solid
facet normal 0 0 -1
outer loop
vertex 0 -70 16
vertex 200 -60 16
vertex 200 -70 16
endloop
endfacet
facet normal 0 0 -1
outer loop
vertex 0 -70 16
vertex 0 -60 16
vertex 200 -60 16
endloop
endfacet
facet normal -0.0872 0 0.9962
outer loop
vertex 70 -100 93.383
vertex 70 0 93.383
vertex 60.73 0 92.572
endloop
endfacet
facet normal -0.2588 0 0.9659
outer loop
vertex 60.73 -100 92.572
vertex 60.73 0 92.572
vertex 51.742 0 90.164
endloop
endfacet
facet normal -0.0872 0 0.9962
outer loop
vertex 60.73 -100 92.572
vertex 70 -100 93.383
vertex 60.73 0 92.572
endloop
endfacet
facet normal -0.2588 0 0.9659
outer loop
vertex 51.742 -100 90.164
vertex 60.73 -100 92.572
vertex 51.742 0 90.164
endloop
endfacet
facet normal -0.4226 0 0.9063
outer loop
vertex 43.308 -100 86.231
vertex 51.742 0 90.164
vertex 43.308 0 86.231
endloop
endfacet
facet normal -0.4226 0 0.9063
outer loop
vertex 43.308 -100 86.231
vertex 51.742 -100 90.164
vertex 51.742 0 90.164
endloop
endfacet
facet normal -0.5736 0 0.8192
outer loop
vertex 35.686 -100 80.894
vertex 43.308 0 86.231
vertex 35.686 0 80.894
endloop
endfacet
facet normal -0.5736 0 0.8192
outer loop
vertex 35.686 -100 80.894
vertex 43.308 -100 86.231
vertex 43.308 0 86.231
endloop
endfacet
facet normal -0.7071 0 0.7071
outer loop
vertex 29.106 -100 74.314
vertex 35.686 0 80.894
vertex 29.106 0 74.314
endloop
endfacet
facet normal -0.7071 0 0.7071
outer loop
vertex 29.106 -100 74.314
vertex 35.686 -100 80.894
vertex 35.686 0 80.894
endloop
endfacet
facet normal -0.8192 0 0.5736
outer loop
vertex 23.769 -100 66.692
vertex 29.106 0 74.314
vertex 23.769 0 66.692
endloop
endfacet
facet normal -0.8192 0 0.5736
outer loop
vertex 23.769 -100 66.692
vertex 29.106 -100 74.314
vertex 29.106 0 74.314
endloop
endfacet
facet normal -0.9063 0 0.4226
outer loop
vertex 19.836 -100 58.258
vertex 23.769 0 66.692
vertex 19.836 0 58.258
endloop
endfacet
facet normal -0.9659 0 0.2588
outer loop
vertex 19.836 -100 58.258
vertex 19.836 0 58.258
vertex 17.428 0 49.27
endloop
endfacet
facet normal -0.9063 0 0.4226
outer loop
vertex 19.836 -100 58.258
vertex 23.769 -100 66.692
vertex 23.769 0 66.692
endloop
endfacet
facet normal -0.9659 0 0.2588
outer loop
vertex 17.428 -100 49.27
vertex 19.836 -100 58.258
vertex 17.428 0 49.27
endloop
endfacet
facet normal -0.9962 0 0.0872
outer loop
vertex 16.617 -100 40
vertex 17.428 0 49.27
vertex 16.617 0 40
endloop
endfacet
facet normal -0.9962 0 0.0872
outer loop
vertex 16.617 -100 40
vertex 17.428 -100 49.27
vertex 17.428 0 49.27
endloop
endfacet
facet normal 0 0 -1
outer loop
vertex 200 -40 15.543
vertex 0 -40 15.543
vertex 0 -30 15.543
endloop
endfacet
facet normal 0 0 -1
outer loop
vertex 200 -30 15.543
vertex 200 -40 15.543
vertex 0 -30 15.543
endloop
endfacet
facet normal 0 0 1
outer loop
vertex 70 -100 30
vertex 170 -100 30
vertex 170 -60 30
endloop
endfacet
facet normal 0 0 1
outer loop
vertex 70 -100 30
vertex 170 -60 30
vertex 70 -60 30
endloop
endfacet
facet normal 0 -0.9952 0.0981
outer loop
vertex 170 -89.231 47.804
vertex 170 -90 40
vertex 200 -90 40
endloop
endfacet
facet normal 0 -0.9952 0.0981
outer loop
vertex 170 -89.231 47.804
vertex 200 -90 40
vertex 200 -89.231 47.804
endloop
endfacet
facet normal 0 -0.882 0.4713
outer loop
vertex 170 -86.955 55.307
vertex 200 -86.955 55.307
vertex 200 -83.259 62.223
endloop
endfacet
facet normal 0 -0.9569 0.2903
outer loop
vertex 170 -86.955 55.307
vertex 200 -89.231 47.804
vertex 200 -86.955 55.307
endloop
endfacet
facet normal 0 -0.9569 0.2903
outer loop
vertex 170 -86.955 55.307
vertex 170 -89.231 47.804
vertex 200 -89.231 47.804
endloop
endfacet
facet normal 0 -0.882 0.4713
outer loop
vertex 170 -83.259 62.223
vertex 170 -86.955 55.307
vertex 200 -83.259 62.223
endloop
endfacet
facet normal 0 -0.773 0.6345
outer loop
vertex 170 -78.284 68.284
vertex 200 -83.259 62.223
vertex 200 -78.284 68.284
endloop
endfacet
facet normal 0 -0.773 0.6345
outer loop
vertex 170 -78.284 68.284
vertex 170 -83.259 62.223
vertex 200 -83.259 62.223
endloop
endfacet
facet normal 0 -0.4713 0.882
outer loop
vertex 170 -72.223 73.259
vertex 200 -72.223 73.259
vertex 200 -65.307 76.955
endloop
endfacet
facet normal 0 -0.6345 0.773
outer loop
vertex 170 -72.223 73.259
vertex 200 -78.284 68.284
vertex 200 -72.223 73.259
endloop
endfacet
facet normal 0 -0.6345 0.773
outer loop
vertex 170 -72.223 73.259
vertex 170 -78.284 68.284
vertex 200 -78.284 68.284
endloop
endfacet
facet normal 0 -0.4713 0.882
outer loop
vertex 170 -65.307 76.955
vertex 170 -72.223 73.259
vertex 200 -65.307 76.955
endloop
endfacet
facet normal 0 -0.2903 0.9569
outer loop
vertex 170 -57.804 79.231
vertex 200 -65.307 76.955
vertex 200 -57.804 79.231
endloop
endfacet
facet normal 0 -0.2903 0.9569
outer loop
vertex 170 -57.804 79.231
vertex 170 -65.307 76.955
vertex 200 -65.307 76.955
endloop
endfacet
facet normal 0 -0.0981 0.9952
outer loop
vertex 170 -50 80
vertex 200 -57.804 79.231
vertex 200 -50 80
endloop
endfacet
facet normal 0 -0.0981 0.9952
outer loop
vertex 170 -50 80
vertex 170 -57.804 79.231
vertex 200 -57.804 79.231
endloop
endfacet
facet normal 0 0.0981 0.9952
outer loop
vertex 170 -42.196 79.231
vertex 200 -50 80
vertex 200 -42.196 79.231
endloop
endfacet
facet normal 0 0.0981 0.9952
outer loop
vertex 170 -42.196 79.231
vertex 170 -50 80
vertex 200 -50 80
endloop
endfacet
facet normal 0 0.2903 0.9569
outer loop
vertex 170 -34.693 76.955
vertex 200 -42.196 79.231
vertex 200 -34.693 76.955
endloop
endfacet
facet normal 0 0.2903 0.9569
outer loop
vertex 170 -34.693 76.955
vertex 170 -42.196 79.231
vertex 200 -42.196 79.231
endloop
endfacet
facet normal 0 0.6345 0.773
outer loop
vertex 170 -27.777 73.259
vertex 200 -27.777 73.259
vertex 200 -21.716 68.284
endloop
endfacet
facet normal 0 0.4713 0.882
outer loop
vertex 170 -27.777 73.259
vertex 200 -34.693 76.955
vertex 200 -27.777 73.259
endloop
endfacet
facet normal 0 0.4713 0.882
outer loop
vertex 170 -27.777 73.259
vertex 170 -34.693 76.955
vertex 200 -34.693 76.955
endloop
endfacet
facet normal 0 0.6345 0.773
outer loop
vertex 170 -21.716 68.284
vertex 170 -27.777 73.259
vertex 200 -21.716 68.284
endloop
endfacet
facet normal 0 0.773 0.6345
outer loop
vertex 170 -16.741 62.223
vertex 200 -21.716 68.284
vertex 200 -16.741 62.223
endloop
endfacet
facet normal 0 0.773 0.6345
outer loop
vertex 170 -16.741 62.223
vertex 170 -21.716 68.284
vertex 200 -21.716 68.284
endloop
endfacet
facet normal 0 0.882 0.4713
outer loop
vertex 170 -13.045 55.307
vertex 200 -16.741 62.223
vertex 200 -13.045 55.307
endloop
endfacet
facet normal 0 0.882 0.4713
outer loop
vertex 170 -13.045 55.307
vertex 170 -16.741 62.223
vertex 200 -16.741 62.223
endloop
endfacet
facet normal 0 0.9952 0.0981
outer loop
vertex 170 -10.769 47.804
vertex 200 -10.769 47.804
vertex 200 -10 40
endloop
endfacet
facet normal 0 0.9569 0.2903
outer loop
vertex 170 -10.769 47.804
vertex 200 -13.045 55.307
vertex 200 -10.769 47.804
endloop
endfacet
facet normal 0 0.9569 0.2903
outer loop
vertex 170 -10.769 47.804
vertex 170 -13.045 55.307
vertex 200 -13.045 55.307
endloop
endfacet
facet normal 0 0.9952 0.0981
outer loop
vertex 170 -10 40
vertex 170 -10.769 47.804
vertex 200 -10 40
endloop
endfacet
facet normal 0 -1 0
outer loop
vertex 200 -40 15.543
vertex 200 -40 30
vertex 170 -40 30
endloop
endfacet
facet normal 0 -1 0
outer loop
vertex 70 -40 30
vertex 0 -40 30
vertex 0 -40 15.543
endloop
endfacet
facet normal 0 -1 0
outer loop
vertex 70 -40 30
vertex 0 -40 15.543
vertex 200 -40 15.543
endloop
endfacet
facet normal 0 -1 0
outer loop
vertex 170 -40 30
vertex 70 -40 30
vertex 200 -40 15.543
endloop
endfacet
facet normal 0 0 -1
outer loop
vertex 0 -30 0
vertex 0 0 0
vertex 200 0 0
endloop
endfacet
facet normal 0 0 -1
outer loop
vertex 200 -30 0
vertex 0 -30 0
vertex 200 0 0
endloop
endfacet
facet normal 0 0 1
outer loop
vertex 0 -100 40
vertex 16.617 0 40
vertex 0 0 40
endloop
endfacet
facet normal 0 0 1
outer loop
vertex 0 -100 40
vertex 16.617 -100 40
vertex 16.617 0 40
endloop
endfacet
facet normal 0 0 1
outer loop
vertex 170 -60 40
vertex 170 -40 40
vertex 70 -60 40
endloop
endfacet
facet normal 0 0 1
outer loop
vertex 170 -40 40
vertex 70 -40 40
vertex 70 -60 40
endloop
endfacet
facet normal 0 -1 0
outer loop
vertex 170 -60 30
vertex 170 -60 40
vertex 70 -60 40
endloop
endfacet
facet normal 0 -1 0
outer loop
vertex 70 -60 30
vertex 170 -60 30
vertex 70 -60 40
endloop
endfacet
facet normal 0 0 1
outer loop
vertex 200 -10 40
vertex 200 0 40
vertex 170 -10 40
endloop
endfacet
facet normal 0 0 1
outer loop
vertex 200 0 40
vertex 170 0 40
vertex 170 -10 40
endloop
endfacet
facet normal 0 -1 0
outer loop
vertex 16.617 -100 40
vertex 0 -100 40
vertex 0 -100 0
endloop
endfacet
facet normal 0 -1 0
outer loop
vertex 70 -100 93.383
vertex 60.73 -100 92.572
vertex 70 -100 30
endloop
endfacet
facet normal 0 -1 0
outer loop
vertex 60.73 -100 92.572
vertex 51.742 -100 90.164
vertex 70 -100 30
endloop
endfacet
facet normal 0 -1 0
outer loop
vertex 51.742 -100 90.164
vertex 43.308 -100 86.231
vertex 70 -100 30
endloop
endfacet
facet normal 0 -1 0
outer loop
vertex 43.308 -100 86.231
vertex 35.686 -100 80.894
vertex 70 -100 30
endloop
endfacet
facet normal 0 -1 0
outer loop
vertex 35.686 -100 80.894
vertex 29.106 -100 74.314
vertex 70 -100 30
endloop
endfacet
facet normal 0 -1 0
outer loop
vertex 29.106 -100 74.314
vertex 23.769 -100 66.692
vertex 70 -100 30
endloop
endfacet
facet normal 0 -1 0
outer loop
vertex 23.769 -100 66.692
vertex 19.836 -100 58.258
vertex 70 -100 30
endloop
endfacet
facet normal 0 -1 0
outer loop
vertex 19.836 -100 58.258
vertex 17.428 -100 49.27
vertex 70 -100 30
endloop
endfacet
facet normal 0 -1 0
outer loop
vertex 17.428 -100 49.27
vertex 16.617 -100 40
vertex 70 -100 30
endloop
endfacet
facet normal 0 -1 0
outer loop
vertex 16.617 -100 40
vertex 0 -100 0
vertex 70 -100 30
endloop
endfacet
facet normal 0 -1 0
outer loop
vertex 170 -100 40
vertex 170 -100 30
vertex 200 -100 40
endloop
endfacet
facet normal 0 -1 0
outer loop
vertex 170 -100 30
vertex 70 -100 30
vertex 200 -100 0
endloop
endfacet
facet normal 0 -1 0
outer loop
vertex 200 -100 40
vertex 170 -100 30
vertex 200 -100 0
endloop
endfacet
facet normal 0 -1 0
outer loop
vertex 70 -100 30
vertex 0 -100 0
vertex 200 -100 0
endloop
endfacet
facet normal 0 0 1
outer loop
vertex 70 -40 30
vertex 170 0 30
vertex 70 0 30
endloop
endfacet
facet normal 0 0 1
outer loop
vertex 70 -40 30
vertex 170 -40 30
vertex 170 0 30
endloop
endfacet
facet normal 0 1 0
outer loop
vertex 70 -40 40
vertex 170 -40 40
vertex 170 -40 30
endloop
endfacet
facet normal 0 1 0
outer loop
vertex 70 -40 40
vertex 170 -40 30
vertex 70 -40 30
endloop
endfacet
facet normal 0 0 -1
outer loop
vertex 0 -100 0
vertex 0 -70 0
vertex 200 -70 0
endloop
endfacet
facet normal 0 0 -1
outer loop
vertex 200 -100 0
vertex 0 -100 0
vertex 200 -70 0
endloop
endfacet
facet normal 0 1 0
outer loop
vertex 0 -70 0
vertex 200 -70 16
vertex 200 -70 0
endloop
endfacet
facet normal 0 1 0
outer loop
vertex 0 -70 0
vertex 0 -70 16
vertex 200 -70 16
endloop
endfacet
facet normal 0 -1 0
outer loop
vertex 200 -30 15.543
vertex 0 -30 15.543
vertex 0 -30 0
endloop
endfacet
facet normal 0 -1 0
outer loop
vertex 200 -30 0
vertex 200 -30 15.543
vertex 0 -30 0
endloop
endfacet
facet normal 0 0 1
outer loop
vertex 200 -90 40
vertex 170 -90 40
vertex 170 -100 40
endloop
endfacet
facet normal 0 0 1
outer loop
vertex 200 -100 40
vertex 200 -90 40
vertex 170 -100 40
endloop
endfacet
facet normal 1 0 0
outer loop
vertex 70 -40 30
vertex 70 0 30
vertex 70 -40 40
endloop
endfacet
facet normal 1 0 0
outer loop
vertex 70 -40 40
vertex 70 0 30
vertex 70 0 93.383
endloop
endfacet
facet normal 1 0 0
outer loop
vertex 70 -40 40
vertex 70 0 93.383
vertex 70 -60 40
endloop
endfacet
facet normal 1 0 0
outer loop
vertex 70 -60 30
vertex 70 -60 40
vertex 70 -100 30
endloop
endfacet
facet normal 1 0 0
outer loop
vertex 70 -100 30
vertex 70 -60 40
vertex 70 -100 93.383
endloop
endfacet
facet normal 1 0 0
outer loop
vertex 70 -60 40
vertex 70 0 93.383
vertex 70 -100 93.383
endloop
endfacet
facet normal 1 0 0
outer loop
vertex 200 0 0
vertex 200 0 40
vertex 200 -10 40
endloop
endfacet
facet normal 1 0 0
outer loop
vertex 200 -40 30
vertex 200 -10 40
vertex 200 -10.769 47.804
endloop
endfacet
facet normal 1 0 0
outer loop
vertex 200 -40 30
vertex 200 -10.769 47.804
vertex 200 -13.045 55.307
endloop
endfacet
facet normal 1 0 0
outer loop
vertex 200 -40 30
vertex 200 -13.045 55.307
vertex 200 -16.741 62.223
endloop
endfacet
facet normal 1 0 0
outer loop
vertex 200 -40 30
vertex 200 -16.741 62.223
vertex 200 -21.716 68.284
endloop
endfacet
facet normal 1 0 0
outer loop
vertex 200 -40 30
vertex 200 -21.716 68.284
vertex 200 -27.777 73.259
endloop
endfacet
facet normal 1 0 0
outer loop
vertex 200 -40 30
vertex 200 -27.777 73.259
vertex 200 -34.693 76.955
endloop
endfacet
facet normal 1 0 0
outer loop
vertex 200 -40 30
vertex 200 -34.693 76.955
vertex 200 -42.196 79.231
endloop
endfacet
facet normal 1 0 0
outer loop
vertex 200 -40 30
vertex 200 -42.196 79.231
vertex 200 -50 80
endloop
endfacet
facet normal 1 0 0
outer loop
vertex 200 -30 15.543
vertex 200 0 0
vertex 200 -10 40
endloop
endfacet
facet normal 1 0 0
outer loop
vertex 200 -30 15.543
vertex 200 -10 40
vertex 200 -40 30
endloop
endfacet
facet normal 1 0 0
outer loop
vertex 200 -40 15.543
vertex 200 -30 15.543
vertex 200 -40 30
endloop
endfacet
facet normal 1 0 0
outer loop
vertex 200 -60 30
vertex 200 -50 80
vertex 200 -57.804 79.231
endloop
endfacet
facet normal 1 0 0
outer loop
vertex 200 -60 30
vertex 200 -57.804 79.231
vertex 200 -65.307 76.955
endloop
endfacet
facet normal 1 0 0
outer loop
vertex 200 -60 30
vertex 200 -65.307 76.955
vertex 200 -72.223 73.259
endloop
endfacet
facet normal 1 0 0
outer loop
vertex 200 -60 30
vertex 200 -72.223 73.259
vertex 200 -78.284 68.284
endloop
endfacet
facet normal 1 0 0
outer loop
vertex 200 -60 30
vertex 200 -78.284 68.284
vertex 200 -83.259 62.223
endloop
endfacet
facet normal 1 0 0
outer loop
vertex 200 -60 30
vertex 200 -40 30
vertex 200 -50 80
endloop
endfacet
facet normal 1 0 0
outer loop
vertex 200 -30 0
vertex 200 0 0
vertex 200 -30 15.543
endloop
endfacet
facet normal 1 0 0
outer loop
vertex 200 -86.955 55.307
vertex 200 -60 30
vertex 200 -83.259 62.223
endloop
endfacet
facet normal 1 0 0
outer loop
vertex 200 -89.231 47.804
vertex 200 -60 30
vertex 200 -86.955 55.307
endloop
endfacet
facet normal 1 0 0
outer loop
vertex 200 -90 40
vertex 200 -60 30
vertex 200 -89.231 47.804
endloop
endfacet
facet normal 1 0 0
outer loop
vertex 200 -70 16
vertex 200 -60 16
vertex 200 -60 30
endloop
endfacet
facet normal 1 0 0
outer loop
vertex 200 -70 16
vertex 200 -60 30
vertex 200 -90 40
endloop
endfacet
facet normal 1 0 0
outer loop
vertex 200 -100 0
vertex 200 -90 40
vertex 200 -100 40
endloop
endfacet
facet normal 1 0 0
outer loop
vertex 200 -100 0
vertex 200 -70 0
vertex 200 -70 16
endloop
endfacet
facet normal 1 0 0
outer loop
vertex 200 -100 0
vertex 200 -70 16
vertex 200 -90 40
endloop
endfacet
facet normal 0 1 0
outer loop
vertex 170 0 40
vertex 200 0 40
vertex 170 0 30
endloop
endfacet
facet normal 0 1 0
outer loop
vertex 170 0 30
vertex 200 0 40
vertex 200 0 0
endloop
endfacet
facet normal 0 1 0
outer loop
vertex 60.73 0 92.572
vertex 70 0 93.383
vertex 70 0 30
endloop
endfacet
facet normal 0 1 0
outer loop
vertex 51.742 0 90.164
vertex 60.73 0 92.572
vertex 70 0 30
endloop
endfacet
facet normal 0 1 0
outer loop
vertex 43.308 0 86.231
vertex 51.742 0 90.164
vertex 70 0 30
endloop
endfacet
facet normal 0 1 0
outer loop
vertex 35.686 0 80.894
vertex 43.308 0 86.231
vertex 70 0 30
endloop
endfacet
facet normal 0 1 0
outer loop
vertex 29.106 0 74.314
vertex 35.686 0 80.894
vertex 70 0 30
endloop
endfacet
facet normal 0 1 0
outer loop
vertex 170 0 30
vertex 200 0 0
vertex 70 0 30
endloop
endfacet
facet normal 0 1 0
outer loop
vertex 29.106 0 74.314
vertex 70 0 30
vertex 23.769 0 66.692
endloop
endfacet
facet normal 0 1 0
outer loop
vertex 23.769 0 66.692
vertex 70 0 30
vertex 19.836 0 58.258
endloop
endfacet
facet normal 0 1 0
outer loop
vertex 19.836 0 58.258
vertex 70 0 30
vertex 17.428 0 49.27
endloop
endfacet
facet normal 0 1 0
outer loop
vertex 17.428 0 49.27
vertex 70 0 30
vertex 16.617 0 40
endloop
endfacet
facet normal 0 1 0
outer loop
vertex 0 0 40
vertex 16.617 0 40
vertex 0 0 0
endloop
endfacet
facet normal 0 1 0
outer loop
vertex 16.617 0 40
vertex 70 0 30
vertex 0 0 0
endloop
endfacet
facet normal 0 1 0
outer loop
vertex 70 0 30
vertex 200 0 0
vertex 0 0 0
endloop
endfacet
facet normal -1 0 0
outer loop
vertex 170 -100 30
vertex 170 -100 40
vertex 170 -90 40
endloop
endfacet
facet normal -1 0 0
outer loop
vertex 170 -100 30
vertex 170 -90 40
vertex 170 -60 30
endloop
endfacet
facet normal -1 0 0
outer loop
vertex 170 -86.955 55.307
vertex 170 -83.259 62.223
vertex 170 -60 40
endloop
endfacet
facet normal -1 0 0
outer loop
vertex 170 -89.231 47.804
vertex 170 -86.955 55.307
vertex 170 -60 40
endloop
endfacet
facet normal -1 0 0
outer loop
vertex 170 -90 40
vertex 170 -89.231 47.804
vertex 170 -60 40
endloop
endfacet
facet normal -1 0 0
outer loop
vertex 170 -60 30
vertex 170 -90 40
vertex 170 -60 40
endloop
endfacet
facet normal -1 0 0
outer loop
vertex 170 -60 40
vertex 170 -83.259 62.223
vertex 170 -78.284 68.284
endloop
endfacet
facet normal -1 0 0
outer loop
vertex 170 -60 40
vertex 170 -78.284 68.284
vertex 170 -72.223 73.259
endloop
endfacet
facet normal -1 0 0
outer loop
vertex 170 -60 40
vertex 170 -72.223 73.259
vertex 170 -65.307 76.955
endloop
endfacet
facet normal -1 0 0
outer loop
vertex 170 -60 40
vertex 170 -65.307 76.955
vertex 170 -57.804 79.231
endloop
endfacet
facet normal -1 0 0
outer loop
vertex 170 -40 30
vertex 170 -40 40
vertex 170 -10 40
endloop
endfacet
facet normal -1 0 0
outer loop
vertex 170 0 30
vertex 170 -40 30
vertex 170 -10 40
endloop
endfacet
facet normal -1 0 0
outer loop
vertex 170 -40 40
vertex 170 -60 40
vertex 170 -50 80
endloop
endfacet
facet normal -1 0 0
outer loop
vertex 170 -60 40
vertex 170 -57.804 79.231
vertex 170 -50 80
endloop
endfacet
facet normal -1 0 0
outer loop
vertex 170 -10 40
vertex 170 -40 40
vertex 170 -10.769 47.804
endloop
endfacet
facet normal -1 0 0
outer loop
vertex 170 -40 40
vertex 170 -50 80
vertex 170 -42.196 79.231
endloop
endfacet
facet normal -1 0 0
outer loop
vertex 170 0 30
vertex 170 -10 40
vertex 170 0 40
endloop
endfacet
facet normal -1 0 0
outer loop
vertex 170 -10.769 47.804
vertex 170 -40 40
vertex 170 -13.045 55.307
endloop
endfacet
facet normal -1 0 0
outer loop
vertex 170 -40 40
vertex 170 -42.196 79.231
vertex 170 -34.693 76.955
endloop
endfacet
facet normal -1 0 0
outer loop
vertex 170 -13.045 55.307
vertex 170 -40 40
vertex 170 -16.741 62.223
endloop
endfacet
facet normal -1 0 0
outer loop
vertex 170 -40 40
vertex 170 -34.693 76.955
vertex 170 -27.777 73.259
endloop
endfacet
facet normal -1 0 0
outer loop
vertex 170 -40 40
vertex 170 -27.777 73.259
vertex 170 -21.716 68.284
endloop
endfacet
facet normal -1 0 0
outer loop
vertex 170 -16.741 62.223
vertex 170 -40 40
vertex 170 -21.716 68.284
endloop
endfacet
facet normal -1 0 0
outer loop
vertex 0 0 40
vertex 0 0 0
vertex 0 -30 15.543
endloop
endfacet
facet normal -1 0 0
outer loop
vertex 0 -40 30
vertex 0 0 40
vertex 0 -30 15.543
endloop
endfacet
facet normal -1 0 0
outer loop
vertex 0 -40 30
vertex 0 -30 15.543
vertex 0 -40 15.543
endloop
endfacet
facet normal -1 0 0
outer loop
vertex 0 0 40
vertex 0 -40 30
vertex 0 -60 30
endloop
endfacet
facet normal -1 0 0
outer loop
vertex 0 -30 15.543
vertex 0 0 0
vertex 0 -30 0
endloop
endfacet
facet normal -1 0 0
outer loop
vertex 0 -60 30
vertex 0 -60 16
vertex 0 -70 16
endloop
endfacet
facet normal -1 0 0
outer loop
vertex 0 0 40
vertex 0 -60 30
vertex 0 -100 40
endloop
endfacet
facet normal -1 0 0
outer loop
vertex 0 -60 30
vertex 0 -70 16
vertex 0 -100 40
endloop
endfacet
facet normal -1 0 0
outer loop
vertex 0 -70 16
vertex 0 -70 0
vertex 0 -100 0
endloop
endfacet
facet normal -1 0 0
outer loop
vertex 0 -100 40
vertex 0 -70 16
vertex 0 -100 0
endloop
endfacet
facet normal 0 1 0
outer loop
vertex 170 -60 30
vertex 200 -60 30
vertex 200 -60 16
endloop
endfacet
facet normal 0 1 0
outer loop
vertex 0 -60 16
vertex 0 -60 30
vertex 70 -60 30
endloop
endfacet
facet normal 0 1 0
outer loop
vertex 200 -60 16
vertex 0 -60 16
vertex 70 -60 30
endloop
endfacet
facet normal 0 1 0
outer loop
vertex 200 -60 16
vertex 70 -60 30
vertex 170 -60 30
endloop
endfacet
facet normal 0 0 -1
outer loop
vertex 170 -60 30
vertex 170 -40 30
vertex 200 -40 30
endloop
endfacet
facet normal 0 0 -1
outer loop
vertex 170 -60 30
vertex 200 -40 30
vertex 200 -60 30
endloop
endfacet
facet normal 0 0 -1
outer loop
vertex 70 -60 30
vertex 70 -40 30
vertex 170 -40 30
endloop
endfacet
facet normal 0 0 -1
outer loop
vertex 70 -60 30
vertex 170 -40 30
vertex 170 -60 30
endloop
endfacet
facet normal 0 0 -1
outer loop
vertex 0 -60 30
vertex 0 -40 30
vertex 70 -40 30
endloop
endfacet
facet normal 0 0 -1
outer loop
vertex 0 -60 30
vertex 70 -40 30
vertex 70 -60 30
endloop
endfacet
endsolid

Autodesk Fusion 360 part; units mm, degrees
sketch "Sketch1" plane through (0, 0, 0) normal (0, 0, 1) x (1, 0, 0)
  line L0 (0, 0) -> (200, 0)
  line L1 (200, 0) -> (200, -100)
  line L2 (200, -100) -> (0, -100)
  line L3 (0, -100) -> (0, 0)
  dimension "d1" = 200
  dimension "d2" = 100
extrude "Extrude1" add sketch "Sketch1" along normal blind 40
sketch "Sketch2" plane through (0, 0, 40) normal (0, 0, 1) x (-1, 0, 0)
  line L0 (0, 100) -> (-200, 100)
  line L1 (-200, 100) -> (-200, 0)
  line L2 (-200, 0) -> (0, 0)
  line L3 (0, 0) -> (0, 100)
  line L4 (-200, 0) -> (-170, 0)
  line L5 (-170, 100) -> (-170, 0)
  line L6 (-200, 100) -> (-170, 100)
extrude "Extrude2" add sketch "Sketch2" along normal blind 40 contours L0 L1 L2 L4 L5 L6
sketch "Sketch3" plane through (170, 0, 0) normal (-1, 0, 0) x (0, -1, 0)
  line L0 (0, 40) -> (100, 40)
  line L1 (100, 40) -> (100, 80)
  line L2 (100, 80) -> (0, 80)
  line L3 (0, 80) -> (0, 40)
  arc A0 (90, 40) -> (10, 40) centre (50, 40) ccw
  dimension "d7" = 80
extrude "Extrude3" cut sketch "Sketch3" against normal blind 30 contours L0 L2 L3 A0 | L0 L1 L2 A0
sketch "Sketch4" plane through (0, 0, 0) normal (-1, 0, 0) x (0, -1, 0)
  line L0 (0, 0) -> (100, 0)
  line L1 (100, 0) -> (100, 40)
  line L2 (100, 40) -> (0, 40)
  line L3 (0, 40) -> (0, 0)
  line L4 (50, 30) -> (40, 30)
  line L5 (40, 30) -> (40, 15.5434)
  line L6 (40, 15.5434) -> (30, 15.5434)
  line L7 (30, 15.5434) -> (30, 0)
  line L8 (50, 30) -> (60, 30)
  line L9 (60, 30) -> (60, 16)
  line L10 (60, 16) -> (70, 16)
  line L11 (70, 16) -> (70, 0)
extrude "Extrude4" cut sketch "Sketch4" against normal blind 200 contours L0 L4 L5 L6 L7 L8 L9 L10 L11
sketch "Sketch5" plane through (0, 0, 40) normal (0, 0, 1) x (-1, 0, 0)
  line L0 (-170, 90) -> (-170, 10)
  line L1 (-170, 10) -> (-200, 10)
  line L2 (-200, 10) -> (-200, 0)
  line L3 (-200, 0) -> (0, 0)
  line L4 (0, 0) -> (0, 100)
  line L5 (0, 100) -> (-200, 100)
  line L6 (-200, 100) -> (-200, 90)
  line L7 (-200, 90) -> (-170, 90)
  line L8 (0, 0) -> (-70, 0)
  line L9 (-70, 0) -> (-70, 100)
  line L10 (-70, 100) -> (0, 100)
  line L11 (0, 100) -> (0, 0)
extrude "Extrude5" add sketch "Sketch5" along normal blind 55 contours L3 L4 L5 L8 L9 L10 L11
sketch "Sketch6" plane through (0, 0, 95) normal (0, 0, 1) x (-1, 0, 0)
  line L0 (0, 100) -> (-70, 100)
  line L1 (-70, 100) -> (-70, 0)
  line L2 (-70, 0) -> (0, 0)
  line L3 (0, 0) -> (0, 100)
  line L4 (0, 0) -> (-16.6169, 0)
  line L5 (-16.6169, 0) -> (-16.6169, 100)
  line L6 (-16.6169, 100) -> (0, 100)
  line L7 (0, 100) -> (0, 0)
extrude "Extrude6" cut sketch "Sketch6" against normal blind 55 contours L0 L2 L3 L4 L5 L6 L7
sketch "Sketch7" plane through (0, -100, 0) normal (0, -1, 0) x (1, 0, 0)
  line L0 (16.6169, 40) -> (0, 40)
  line L1 (0, 40) -> (0, 0)
  line L2 (0, 0) -> (200, 0)
  line L3 (200, 0) -> (200, 40)
  line L4 (200, 40) -> (70, 40)
  line L5 (70, 40) -> (70, 95)
  line L6 (70, 95) -> (16.6169, 95)
  line L7 (16.6169, 95) -> (16.6169, 40)
  arc A0 (70, 93.3831) -> (16.6169, 40) centre (70, 40) ccw
  line L8 (70, 93.3831) -> (16.6169, 93.3831)
extrude "Extrude7" cut sketch "Sketch7" against normal blind 200 contours L5 L6 L7 L8
sketch "Sketch8" plane through (0, -100, 0) normal (0, -1, 0) x (1, 0, 0)
  line L0 (70, 93.3831) -> (16.6169, 93.3831)
  line L1 (16.6169, 93.3831) -> (16.6169, 40)
  line L2 (16.6169, 40) -> (0, 40)
  line L3 (0, 40) -> (0, 0)
  line L4 (0, 0) -> (200, 0)
  line L5 (200, 0) -> (200, 40)
  line L6 (200, 40) -> (70, 40)
  line L7 (70, 40) -> (70, 93.3831)
  arc A0 (70, 93.3831) -> (16.6169, 40) centre (70, 40) ccw
extrude "Extrude8" cut sketch "Sketch8" against normal blind 200 contours L0 L1 A0
sketch "Sketch9" plane through (0, 0, 40) normal (0, 0, 1) x (-1, 0, 0)
  line L0 (-70, 0) -> (-70, 100)
  line L1 (-70, 100) -> (-200, 100)
  line L2 (-200, 100) -> (-200, 90)
  line L3 (-200, 90) -> (-170, 90)
  line L4 (-170, 90) -> (-170, 10)
  line L5 (-170, 10) -> (-200, 10)
  line L6 (-200, 10) -> (-200, 0)
  line L7 (-200, 0) -> (-70, 0)
  line L8 (-170, 0) -> (-170, 40)
  line L9 (-170, 40) -> (-70, 40)
  line L10 (-170, 100) -> (-170, 60)
  line L11 (-170, 60) -> (-70, 60)
  dimension "d20" = 40
  dimension "d21" = 40
extrude "Extrude9" cut sketch "Sketch9" against normal blind 10 contours L0 L4 L7 L8 L9 | L0 L1 L4 L10 L11
